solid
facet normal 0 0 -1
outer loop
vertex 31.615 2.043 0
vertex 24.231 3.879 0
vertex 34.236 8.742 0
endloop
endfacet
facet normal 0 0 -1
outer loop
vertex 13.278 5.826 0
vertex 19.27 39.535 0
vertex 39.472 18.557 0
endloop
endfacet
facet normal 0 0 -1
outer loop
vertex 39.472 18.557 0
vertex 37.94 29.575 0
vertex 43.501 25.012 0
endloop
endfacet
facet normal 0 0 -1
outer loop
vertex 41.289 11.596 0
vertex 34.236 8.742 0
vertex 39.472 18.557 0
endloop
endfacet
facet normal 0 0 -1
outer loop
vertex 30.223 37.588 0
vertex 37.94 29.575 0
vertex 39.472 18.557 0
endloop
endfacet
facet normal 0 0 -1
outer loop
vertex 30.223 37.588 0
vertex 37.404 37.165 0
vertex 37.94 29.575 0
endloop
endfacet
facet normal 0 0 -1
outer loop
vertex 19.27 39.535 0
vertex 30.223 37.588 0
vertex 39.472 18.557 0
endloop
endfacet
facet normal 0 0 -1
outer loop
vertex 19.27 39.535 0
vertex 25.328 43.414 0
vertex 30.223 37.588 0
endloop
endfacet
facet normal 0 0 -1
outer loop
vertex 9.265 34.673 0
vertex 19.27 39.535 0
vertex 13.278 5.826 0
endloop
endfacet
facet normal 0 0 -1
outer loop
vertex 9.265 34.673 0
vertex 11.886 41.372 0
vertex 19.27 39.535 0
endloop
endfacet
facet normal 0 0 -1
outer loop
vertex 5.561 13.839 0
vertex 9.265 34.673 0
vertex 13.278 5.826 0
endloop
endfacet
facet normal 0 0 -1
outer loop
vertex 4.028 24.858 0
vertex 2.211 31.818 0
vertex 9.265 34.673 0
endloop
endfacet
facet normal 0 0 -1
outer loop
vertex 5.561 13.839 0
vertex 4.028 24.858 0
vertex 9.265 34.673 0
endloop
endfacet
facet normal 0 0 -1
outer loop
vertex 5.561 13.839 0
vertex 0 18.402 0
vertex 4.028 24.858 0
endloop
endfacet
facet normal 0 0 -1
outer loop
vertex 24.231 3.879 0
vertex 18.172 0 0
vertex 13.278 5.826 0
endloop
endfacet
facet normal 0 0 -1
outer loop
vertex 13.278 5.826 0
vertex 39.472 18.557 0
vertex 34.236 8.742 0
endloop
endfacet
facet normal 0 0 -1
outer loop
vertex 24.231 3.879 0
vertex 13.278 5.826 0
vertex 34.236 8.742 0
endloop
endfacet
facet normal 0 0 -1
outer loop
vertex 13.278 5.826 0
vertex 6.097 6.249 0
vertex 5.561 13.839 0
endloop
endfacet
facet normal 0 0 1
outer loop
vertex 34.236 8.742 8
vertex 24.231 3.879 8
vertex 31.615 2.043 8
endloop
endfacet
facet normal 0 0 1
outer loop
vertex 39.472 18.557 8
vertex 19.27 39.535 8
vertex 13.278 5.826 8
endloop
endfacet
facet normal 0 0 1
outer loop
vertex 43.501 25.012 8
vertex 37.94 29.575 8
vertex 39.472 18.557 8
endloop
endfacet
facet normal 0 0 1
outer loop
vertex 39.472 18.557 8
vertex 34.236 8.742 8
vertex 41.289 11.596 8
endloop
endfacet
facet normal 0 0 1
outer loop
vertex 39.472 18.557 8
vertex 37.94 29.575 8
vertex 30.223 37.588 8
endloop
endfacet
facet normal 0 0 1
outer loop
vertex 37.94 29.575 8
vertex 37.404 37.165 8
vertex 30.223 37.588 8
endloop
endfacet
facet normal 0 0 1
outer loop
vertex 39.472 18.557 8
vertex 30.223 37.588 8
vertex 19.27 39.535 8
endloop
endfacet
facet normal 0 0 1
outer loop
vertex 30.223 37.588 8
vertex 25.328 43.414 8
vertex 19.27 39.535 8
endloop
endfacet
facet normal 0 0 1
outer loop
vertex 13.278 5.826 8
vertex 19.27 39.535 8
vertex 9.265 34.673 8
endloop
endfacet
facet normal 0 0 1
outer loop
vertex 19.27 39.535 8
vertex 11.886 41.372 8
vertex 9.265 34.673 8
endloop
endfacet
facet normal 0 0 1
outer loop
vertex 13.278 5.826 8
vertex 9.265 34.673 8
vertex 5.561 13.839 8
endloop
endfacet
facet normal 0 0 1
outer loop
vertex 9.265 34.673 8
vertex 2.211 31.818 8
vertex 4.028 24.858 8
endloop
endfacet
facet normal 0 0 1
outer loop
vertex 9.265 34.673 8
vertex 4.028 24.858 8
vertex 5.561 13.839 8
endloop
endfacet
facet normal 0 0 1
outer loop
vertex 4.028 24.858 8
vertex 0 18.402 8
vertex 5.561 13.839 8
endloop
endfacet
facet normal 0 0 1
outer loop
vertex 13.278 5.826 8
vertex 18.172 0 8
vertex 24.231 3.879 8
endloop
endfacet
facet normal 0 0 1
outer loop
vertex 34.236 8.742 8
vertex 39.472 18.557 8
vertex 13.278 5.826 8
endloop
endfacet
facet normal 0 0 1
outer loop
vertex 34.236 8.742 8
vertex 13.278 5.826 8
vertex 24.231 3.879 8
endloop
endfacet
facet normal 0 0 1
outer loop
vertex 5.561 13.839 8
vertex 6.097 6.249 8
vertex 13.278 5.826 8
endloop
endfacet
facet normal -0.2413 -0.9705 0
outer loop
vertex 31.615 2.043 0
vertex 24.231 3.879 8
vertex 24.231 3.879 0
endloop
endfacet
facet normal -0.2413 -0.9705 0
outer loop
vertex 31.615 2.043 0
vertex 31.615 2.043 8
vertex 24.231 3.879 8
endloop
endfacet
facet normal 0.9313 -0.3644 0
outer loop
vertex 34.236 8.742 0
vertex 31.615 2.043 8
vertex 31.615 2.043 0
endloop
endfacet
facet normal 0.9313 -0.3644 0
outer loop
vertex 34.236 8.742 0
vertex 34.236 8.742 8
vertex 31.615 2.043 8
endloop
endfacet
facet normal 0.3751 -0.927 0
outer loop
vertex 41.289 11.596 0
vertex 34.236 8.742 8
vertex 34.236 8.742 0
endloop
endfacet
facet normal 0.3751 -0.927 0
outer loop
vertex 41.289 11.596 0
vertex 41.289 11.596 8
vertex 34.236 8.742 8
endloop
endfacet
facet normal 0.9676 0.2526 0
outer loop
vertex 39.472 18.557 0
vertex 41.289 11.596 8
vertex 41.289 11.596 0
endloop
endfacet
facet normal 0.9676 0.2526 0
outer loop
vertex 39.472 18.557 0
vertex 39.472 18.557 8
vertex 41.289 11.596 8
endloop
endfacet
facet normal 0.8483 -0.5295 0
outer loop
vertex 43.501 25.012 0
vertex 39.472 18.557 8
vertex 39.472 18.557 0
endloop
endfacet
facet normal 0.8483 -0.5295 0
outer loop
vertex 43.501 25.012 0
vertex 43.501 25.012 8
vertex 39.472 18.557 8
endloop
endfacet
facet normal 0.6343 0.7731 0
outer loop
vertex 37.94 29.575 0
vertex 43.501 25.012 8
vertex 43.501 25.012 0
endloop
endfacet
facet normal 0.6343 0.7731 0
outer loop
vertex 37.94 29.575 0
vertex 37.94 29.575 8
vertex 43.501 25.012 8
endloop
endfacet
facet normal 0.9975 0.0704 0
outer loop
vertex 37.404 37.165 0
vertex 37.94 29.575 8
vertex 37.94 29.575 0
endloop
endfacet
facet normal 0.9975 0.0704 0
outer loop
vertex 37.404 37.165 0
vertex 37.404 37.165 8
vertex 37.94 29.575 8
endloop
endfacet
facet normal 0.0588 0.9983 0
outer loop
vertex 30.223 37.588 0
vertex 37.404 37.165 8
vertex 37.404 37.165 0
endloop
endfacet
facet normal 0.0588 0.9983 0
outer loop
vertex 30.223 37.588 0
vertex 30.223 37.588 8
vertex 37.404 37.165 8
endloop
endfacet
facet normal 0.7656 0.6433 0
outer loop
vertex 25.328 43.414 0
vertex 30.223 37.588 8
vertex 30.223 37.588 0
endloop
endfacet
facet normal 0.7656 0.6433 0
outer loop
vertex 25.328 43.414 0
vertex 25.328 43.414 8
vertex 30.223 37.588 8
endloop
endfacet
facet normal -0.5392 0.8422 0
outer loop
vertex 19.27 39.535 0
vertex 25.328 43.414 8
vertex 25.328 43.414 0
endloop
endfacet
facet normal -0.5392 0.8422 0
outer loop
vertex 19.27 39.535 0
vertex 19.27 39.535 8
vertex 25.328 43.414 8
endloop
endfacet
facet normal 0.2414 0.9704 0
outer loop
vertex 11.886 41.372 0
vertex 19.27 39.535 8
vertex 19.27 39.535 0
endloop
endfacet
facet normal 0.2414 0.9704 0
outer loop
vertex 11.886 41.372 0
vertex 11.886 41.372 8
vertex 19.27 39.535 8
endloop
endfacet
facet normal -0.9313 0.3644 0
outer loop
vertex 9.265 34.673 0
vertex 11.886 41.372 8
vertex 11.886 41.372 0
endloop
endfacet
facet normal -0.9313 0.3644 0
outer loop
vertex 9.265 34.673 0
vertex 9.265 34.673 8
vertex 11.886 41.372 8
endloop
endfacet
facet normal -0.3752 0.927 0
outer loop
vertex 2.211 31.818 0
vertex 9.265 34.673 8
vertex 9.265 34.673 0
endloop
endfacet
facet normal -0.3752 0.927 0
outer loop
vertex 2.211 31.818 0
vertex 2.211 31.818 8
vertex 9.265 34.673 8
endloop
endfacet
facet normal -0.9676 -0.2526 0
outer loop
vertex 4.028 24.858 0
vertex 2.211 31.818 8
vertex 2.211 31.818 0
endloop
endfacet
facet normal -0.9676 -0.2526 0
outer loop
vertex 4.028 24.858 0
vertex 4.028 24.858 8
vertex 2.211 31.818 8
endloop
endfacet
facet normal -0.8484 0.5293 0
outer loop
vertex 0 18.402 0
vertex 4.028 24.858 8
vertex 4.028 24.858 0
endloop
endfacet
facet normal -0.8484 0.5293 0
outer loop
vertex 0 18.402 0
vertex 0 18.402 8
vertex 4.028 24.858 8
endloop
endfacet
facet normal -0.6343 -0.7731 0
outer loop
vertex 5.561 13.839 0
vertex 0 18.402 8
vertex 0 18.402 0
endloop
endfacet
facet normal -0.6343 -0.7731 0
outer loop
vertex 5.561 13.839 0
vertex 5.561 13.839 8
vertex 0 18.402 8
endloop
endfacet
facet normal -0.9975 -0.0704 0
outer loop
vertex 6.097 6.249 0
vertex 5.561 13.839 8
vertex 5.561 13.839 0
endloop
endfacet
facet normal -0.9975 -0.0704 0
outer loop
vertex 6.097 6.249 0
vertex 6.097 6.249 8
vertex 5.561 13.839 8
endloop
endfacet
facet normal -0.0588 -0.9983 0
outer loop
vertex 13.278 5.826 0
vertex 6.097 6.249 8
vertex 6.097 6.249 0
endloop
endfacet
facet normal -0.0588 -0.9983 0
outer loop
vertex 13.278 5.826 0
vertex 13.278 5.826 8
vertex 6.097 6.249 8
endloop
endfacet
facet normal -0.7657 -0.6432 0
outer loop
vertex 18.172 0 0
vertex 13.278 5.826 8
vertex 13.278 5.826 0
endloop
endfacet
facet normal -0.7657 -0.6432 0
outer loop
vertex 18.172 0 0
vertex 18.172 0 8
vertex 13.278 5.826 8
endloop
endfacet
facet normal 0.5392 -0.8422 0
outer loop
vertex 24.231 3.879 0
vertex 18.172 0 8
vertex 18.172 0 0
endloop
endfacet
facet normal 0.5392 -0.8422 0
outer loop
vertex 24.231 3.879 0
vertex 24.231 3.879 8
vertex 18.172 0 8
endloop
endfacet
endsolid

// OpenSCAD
$fn = 32;

// ----------------------------------------------------------------------
// Chain sprocket: 10 teeth, 18 mm root radius
// ----------------------------------------------------------------------

// --- parameters (mm) ---
profile_height = 8;       // extrusion height
profile_points = 20;      // points of the closed outline

profile = [[39.472, 18.557], [43.501, 25.012], [37.94, 29.575], [37.404, 37.165], [30.223, 37.588], [25.328, 43.414], [19.27, 39.535], [11.886, 41.372], [9.265, 34.673], [2.211, 31.818], [4.028, 24.858], [0, 18.402], [5.561, 13.839], [6.097, 6.249], [13.278, 5.826], [18.172, 0], [24.231, 3.879], [31.615, 2.043], [34.236, 8.742], [41.289, 11.596]];  // single closed polygon, 20 points, counter clockwise

// --- the one profile operation ---
linear_extrude(height = profile_height) polygon(points = profile);
